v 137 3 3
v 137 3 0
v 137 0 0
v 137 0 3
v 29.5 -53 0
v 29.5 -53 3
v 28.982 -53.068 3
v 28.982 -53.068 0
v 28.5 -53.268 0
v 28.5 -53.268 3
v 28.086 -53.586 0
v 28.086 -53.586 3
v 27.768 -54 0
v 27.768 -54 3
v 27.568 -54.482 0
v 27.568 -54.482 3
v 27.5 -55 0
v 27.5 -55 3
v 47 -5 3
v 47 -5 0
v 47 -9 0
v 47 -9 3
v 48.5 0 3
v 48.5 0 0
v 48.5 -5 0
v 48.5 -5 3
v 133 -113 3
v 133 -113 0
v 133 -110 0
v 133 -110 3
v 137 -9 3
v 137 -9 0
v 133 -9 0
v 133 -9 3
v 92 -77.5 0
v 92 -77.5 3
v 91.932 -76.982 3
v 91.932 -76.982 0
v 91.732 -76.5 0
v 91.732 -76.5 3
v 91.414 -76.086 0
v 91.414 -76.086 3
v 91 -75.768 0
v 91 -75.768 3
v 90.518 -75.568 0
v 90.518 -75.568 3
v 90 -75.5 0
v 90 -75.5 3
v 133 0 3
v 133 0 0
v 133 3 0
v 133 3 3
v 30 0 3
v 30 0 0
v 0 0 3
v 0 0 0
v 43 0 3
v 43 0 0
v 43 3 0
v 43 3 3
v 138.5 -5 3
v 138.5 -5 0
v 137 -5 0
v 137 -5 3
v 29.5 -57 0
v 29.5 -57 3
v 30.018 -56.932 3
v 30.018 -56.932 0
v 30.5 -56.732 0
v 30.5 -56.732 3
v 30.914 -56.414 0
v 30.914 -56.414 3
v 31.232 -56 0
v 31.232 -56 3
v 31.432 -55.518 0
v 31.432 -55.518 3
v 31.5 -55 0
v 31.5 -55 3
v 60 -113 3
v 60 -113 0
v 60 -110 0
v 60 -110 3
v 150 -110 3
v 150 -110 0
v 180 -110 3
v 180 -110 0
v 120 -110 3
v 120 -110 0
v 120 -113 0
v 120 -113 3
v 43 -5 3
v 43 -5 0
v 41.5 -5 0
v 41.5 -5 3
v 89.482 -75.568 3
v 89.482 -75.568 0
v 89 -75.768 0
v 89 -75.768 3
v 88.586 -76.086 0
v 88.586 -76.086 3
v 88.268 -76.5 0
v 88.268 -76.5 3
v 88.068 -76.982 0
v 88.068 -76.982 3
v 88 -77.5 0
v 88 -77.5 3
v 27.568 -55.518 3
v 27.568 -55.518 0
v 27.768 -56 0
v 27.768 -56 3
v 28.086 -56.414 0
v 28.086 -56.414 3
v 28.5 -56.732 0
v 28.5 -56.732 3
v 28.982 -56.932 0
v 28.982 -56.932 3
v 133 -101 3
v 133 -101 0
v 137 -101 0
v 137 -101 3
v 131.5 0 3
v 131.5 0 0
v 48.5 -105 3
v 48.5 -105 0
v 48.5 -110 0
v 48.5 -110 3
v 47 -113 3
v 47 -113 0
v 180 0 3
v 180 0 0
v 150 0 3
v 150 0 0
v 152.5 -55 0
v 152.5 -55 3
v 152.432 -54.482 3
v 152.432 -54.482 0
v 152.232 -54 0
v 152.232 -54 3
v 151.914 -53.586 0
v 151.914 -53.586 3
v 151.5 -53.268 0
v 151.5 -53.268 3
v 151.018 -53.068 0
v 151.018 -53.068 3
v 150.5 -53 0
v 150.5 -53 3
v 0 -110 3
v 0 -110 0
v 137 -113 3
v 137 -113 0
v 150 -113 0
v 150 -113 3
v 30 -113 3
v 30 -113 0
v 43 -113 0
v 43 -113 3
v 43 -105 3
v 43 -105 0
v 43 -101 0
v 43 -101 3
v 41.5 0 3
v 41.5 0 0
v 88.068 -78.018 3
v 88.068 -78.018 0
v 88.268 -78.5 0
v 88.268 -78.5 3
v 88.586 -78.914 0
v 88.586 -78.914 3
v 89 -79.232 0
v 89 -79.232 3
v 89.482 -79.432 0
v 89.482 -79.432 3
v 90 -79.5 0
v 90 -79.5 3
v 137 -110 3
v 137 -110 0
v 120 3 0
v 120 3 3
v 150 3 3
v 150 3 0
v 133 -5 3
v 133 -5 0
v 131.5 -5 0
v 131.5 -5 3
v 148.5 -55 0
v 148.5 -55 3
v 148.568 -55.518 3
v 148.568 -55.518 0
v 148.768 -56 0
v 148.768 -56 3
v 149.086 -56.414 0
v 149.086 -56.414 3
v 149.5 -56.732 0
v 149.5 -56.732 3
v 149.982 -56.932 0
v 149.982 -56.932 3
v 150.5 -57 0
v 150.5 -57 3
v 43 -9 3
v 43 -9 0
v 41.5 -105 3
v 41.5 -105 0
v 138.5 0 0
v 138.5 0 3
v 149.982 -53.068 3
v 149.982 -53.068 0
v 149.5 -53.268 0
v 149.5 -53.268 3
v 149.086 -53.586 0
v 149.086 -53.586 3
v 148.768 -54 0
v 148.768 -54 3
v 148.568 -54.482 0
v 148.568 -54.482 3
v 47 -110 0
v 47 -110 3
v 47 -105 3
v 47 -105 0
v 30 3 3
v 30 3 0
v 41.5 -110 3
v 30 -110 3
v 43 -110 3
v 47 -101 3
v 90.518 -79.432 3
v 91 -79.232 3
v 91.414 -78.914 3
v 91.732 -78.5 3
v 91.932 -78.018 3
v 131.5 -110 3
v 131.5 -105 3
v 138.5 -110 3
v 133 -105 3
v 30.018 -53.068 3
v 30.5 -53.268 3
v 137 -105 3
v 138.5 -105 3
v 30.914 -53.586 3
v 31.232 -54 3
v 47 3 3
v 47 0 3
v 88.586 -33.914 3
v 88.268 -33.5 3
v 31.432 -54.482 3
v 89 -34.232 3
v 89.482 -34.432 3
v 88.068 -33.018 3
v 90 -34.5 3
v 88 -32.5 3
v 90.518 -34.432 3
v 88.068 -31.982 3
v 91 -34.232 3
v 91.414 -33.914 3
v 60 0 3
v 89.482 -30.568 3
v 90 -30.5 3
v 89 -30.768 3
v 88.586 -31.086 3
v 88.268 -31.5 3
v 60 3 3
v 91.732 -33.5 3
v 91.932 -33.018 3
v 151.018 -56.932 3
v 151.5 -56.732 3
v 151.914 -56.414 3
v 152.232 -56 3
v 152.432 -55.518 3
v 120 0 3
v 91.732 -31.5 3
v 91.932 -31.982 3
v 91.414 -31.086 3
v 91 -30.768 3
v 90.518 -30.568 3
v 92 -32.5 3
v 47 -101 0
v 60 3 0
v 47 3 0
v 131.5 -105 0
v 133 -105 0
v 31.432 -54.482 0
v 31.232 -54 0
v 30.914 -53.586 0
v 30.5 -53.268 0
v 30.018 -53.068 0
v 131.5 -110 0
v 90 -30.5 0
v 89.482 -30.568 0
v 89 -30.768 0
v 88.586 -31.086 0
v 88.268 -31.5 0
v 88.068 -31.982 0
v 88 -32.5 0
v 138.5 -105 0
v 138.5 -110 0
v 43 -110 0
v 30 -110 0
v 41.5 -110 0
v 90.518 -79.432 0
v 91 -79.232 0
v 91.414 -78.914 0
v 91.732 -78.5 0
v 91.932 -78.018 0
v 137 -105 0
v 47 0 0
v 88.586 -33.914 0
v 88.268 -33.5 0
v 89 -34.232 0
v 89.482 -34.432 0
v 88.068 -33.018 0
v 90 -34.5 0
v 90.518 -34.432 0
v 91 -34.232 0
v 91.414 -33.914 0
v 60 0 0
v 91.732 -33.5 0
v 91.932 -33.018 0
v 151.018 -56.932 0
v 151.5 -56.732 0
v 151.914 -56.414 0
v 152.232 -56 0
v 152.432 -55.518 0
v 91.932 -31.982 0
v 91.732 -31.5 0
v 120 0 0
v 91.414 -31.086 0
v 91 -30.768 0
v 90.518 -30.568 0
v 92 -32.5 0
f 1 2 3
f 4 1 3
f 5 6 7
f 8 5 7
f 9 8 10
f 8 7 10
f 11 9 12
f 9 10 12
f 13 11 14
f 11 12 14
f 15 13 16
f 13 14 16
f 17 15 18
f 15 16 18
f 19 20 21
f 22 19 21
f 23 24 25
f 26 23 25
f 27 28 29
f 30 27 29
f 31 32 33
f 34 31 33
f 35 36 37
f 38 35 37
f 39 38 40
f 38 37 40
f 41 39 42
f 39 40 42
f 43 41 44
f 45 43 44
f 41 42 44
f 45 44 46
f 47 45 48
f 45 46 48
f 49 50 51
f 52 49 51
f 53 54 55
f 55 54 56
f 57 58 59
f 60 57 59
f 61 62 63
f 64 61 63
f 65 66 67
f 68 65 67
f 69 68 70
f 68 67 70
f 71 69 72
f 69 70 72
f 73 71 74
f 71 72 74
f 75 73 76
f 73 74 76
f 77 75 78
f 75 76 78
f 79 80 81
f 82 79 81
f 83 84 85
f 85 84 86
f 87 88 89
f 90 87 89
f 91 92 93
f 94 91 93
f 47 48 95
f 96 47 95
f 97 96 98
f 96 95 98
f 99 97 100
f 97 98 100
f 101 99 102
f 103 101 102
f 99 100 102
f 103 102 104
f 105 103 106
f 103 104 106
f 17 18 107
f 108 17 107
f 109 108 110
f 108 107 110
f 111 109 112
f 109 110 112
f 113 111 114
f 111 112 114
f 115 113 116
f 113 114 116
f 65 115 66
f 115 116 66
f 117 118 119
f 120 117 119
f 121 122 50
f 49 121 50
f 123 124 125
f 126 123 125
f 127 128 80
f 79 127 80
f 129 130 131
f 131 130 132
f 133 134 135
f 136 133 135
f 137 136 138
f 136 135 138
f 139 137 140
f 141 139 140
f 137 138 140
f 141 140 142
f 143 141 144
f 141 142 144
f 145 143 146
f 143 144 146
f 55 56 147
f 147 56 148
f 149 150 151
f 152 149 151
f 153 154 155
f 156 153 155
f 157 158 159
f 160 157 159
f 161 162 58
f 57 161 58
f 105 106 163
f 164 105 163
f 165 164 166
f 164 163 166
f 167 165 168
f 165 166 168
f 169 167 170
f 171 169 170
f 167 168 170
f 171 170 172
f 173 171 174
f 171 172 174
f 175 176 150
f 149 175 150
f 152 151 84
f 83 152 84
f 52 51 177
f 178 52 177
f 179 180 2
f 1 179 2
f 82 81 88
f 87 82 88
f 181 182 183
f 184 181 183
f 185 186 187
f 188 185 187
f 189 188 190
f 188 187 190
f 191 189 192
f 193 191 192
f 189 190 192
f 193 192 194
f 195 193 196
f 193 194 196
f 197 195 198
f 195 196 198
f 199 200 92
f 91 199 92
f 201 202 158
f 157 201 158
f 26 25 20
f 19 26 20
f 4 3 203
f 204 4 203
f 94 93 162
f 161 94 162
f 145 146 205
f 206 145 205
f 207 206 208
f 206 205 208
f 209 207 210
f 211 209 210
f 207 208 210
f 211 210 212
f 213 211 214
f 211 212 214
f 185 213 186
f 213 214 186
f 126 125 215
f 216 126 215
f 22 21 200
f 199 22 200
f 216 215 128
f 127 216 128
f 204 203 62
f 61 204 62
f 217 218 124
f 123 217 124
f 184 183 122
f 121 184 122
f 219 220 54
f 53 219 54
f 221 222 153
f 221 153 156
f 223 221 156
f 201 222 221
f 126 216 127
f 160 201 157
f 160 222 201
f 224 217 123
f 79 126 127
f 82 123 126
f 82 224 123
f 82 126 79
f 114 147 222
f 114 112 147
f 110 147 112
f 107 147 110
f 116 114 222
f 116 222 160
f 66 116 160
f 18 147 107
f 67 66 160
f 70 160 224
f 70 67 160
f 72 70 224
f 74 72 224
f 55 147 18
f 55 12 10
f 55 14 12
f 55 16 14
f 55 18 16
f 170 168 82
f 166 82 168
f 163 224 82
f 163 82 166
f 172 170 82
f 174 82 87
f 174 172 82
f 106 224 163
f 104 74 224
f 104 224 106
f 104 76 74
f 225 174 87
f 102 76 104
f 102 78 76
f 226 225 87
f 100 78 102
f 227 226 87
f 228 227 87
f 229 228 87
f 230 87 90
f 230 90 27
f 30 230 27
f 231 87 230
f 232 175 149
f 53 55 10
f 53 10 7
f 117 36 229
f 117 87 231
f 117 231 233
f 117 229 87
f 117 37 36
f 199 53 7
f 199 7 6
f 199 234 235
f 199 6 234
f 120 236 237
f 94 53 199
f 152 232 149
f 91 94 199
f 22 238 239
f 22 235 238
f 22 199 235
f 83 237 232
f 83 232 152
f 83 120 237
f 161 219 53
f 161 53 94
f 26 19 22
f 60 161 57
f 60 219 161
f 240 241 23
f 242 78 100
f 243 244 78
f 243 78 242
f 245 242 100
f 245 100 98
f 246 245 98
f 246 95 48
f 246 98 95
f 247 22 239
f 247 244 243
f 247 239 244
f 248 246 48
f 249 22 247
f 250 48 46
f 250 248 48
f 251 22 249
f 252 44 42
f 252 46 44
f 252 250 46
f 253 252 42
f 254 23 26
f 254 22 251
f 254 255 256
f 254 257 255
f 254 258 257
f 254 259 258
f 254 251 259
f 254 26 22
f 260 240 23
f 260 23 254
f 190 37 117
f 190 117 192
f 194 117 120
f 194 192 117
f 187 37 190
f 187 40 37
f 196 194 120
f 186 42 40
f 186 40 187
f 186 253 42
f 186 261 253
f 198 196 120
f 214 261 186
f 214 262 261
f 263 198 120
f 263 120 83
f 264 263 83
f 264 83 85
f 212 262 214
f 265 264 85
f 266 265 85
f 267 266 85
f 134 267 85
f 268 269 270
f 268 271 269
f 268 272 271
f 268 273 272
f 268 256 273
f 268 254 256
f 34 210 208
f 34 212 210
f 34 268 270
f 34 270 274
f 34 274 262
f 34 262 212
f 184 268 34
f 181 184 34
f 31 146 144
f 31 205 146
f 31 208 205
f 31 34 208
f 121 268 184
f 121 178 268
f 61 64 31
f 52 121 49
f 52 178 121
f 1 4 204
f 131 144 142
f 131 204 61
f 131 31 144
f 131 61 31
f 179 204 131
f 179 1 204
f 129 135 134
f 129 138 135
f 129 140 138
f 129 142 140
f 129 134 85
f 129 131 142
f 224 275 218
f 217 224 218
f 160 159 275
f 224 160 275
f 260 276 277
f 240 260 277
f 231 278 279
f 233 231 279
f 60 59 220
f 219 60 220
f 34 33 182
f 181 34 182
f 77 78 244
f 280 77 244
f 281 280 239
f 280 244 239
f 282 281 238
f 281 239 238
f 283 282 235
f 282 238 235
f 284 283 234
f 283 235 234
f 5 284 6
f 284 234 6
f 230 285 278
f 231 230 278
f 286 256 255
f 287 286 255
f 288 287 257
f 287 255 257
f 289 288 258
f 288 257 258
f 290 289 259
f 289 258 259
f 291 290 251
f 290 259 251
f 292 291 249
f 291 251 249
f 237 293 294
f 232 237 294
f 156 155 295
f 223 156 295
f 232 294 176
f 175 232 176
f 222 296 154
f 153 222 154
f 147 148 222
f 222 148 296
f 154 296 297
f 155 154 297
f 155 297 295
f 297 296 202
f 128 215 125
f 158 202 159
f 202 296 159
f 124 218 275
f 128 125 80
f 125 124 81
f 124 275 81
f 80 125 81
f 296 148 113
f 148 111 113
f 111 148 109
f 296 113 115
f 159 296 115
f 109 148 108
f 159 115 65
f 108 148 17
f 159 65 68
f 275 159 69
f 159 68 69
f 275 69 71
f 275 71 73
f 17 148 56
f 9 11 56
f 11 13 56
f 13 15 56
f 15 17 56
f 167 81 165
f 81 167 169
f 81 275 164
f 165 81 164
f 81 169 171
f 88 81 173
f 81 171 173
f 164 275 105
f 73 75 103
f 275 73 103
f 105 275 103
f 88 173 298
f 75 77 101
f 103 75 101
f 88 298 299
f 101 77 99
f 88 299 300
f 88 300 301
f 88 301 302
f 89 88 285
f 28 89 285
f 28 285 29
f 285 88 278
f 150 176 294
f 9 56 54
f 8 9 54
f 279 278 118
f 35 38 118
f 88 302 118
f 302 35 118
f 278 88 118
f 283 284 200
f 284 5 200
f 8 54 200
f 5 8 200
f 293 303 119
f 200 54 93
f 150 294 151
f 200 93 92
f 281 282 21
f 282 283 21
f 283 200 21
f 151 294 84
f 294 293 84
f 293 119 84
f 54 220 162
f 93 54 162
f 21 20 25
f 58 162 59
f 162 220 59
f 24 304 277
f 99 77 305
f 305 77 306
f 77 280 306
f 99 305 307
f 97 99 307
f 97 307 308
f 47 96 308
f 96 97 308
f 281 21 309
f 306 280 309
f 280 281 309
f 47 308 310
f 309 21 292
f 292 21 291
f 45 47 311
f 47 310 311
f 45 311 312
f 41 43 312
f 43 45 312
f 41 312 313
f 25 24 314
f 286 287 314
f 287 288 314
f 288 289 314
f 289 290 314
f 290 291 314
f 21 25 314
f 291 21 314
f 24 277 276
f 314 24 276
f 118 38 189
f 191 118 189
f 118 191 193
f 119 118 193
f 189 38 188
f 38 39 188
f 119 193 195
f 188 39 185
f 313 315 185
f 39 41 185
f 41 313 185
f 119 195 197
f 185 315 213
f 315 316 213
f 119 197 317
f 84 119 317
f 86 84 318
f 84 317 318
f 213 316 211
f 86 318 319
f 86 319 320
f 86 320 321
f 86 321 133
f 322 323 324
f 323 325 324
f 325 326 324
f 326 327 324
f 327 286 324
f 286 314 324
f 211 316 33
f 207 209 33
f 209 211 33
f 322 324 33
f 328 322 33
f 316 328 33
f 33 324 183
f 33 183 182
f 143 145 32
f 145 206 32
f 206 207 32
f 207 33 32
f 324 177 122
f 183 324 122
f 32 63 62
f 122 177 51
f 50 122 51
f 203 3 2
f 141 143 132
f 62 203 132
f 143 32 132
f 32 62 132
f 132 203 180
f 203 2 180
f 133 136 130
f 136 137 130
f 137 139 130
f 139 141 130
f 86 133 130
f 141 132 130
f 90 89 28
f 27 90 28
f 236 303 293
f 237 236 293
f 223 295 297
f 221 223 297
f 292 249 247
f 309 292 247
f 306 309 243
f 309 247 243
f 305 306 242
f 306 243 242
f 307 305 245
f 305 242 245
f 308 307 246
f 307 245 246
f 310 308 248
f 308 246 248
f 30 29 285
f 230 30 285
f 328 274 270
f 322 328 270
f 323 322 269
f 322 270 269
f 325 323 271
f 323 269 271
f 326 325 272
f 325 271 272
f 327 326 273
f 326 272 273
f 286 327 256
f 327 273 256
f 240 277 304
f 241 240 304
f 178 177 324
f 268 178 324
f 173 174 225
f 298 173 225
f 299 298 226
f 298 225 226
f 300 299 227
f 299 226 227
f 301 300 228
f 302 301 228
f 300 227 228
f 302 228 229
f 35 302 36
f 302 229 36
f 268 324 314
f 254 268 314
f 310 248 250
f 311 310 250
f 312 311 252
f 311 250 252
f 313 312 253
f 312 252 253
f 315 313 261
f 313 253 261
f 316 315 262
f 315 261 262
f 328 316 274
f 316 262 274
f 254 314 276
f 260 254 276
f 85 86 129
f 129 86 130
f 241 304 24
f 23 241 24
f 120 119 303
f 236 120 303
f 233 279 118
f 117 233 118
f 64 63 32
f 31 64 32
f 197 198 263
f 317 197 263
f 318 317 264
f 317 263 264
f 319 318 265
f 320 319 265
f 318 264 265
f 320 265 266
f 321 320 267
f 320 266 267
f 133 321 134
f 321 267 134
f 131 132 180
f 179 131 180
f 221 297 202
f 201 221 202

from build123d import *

# Parameters (mm, degrees)
EXTRUDE_1_DEPTH     = 3
CUT_EXTRUDE_1_DEPTH = 213.55117031


with BuildPart() as part:
    # 草图1 → 凸台-拉伸1 (new body)
    with BuildSketch(Plane.XY):
        Polygon((90, -55), (90, 0), (60, 0), (48.5, 0), (48.5, -5), (47, -5), (47, -9), (43, -9), (43, -5), (41.5, -5), (41.5, 0), (30, 0), (0, 0), (0, -55), align=None)
        Polygon((120, 0), (90, 0), (90, -55), (180, -55), (180, 0), (150, 0), (138.5, 0), (138.5, -5), (137, -5), (137, -9), (133, -9), (133, -5), (131.5, -5), (131.5, 0), align=None)
        Polygon((180, -55), (90, -55), (90, -110), (120, -110), (131.5, -110), (131.5, -105), (133, -105), (133, -101), (137, -101), (137, -105), (138.5, -105), (138.5, -110), (150, -110), (180, -110), align=None)
        Polygon((90, -110), (90, -55), (0, -55), (0, -110), (30, -110), (41.5, -110), (41.5, -105), (43, -105), (43, -101), (47, -101), (47, -105), (48.5, -105), (48.5, -110), (60, -110), align=None)
        Polygon((120, 3), (120, 0), (131.5, 0), (133, 0), (133, 3), align=None)
        Polygon((138.5, 0), (150, 0), (150, 3), (137, 3), (137, 0), align=None)
        Polygon((30, 3), (30, 0), (41.5, 0), (43, 0), (43, 3), align=None)
        Polygon((48.5, 0), (60, 0), (60, 3), (47, 3), (47, 0), align=None)
        Polygon((60, -113), (60, -110), (48.5, -110), (47, -110), (47, -113), align=None)
        Polygon((41.5, -110), (30, -110), (30, -113), (43, -113), (43, -110), align=None)
        Polygon((150, -113), (150, -110), (138.5, -110), (137, -110), (137, -113), align=None)
        Polygon((131.5, -110), (120, -110), (120, -113), (133, -113), (133, -110), align=None)
    extrude(amount=EXTRUDE_1_DEPTH)

    # 草图2 → 切除-拉伸1 (cut, through all)
    with BuildSketch(Plane.XY.offset(3)):
        with BuildLine():
            ThreePointArc((31.5, -55), (30.914213562, -53.585786438), (29.5, -53))
            Line((29.5, -53), (29.5, -55))
            Line((29.5, -55), (31.5, -55))
        make_face()
        with BuildLine():
            Line((29.5, -55), (29.5, -53))
            ThreePointArc((29.5, -53), (28.085786438, -53.585786438), (27.5, -55))
            Line((27.5, -55), (29.5, -55))
        make_face()
        with BuildLine():
            ThreePointArc((29.5, -57), (30.914213562, -56.414213562), (31.5, -55))
            Line((31.5, -55), (29.5, -55))
            Line((29.5, -55), (29.5, -57))
        make_face()
        with BuildLine():
            Line((29.5, -57), (29.5, -55))
            Line((29.5, -55), (27.5, -55))
            ThreePointArc((27.5, -55), (28.085786438, -56.414213562), (29.5, -57))
        make_face()
        with BuildLine():
            ThreePointArc((92, -77.5), (91.414213562, -76.085786438), (90, -75.5))
            Line((90, -75.5), (90, -77.5))
            Line((90, -77.5), (92, -77.5))
        make_face()
        with BuildLine():
            Line((90, -77.5), (90, -75.5))
            ThreePointArc((90, -75.5), (88.585786438, -76.085786438), (88, -77.5))
            Line((88, -77.5), (90, -77.5))
        make_face()
        with BuildLine():
            Line((92, -77.5), (90, -77.5))
            Line((90, -77.5), (90, -79.5))
            ThreePointArc((90, -79.5), (91.414213562, -78.914213562), (92, -77.5))
        make_face()
        with BuildLine():
            Line((90, -79.5), (90, -77.5))
            Line((90, -77.5), (88, -77.5))
            ThreePointArc((88, -77.5), (88.585786438, -78.914213562), (90, -79.5))
        make_face()
        with BuildLine():
            ThreePointArc((92, -32.5), (91.414213562, -31.085786438), (90, -30.5))
            Line((90, -30.5), (90, -32.5))
            Line((90, -32.5), (92, -32.5))
        make_face()
        with BuildLine():
            Line((90, -32.5), (90, -30.5))
            ThreePointArc((90, -30.5), (88.585786438, -31.085786438), (88, -32.5))
            Line((88, -32.5), (90, -32.5))
        make_face()
        with BuildLine():
            Line((92, -32.5), (90, -32.5))
            Line((90, -32.5), (90, -34.5))
            ThreePointArc((90, -34.5), (91.414213562, -33.914213562), (92, -32.5))
        make_face()
        with BuildLine():
            Line((90, -34.5), (90, -32.5))
            Line((90, -32.5), (88, -32.5))
            ThreePointArc((88, -32.5), (88.585786438, -33.914213562), (90, -34.5))
        make_face()
        with BuildLine():
            ThreePointArc((152.5, -55), (151.914213562, -53.585786438), (150.5, -53))
            Line((150.5, -53), (150.5, -55))
            Line((150.5, -55), (152.5, -55))
        make_face()
        with BuildLine():
            Line((150.5, -55), (150.5, -53))
            ThreePointArc((150.5, -53), (149.085786438, -53.585786438), (148.5, -55))
            Line((148.5, -55), (150.5, -55))
        make_face()
        with BuildLine():
            Line((150.5, -55), (148.5, -55))
            ThreePointArc((148.5, -55), (149.085786438, -56.414213562), (150.5, -57))
            Line((150.5, -57), (150.5, -55))
        make_face()
        with BuildLine():
            Line((152.5, -55), (150.5, -55))
            Line((150.5, -55), (150.5, -57))
            ThreePointArc((150.5, -57), (151.914213562, -56.414213562), (152.5, -55))
        make_face()
    extrude(amount=-CUT_EXTRUDE_1_DEPTH, mode=Mode.SUBTRACT)


solid = part.part
